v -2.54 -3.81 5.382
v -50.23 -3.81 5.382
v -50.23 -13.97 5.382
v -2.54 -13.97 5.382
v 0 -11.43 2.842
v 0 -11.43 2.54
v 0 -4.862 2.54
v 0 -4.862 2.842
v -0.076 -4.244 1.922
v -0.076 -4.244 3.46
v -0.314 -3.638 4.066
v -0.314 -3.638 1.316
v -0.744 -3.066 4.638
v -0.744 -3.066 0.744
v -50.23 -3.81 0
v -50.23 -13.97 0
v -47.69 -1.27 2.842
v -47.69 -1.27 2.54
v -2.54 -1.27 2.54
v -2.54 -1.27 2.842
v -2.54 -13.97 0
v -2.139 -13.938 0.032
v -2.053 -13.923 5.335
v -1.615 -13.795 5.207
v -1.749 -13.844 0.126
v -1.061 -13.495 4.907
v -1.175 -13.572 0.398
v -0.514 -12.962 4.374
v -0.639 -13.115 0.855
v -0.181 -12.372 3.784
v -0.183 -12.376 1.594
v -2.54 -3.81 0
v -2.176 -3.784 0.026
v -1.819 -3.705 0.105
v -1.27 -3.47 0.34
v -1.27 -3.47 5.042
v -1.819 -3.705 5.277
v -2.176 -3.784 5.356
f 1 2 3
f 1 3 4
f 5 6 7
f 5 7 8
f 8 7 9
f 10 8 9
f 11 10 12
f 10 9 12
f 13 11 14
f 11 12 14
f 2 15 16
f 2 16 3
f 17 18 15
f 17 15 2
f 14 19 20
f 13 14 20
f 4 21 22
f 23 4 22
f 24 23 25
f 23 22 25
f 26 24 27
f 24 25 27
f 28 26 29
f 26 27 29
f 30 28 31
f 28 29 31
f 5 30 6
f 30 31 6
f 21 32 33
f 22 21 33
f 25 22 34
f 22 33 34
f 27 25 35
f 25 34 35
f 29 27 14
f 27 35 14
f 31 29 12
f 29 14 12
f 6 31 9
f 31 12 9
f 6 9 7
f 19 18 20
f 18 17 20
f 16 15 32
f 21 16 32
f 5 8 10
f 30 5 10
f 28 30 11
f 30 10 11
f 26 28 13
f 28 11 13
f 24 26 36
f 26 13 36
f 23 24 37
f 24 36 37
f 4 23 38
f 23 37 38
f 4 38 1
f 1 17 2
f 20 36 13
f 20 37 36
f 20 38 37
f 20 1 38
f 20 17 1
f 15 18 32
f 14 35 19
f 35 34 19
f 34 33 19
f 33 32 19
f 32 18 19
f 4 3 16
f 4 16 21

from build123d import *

# Parameters (mm, degrees)
F1_DEPTH    = 1.27
F2_W        = 50.2304956317
F2_H        = 5.3818384185
F3_DEPTH    = 12.7
F5_SIZE     = 2.54
F6_T1_DEPTH = 22.86
F6_T3_DEPTH = 10.6423506607
F6_T5_DEPTH = 18.0818384185


# Not quite as in the source:
# - a fillet or chamfer that OpenCascade refuses, or shapes differently, is made with other operations: its cross-section is extruded or revolved along the edge and cut away or added


with BuildPart() as f1:
    # F0 (on Front) → F1 (new body)
    with BuildSketch(Plane.XZ):
        with BuildLine():
            ThreePointArc((3.2290674407, 2.4202670825), (3.8285241608, 1.2755281407), (4.0354143885, 0))
            ThreePointArc((4.0354143885, 0), (3.8285241608, -1.2755281407), (3.2290674407, -2.4202670825))
            Line((3.2290674407, -2.4202670825), (3.2290674407, -2.6700689923))
            Line((3.2290674407, -2.6700689923), (53.7696667016, -2.6700689923))
            Line((53.7696667016, -2.6700689923), (53.7696667016, 2.4202670825))
            Line((53.7696667016, 2.4202670825), (3.2290674407, 2.4202670825))
        make_face()
    extrude(amount=F1_DEPTH)


with BuildPart() as f3:
    # F2 (on face) → F3 (new body)
    with BuildSketch(Plane.XZ.offset(1.27)):
        with Locations((-25.1152478158, 2.6909192093)):
            Rectangle(F2_W, F2_H)
    extrude(amount=F3_DEPTH)

    # F5
    f5_edges = [f3.edges().sort_by_distance(p)[0] for p in [
        (-25.115248, -1.27, 0),
        (0, -1.27, 2.690919),
        (-25.115248, -1.27, 5.381838),
        (-50.230496, -1.27, 2.690919),
    ]]
    chamfer(f5_edges, length=F5_SIZE)

    # F6: fillet of radius 2.54 on 4 edges, made by hand

    # F6_s2 → F6_t1 (cut)
    with BuildSketch(Plane.XZ.offset(-2.54)):
        with BuildLine():
            ThreePointArc((-2.54, 0), (-0.7439487758, 0.7439487758), (0, 2.54))
            Line((0, 2.54), (0, 0))
            Line((0, 0), (-2.54, 0))
        make_face()
        with BuildLine():
            ThreePointArc((0, 2.8418384185), (-0.7439487758, 4.6378896428), (-2.54, 5.3818384185))
            Line((-2.54, 5.3818384185), (0, 5.3818384185))
            Line((0, 5.3818384185), (0, 2.8418384185))
        make_face()
    extrude(amount=F6_T1_DEPTH, mode=Mode.SUBTRACT)

    # F6_s4 → F6_t3 (cut)
    with BuildSketch(Plane.XY.offset(-2.6302561211)):
        with BuildLine():
            ThreePointArc((0, -4.8621024484), (-0.1933459874, -3.8900865302), (-0.7439487758, -3.0660512242))
            Line((-0.7439487758, -3.0660512242), (0, -3.81))
            Line((0, -3.81), (0, -4.8621024484))
        make_face()
    extrude(amount=F6_T3_DEPTH, mode=Mode.SUBTRACT)

    # F6_s6 → F6_t5 (cut)
    with BuildSketch(Plane.XY.offset(-6.35)):
        with BuildLine():
            ThreePointArc((-2.54, -13.97), (-0.7439487758, -13.2260512242), (0, -11.43))
            Line((0, -11.43), (0, -13.97))
            Line((0, -13.97), (-2.54, -13.97))
        make_face()
    extrude(amount=F6_T5_DEPTH, mode=Mode.SUBTRACT)


solid = f3.part
